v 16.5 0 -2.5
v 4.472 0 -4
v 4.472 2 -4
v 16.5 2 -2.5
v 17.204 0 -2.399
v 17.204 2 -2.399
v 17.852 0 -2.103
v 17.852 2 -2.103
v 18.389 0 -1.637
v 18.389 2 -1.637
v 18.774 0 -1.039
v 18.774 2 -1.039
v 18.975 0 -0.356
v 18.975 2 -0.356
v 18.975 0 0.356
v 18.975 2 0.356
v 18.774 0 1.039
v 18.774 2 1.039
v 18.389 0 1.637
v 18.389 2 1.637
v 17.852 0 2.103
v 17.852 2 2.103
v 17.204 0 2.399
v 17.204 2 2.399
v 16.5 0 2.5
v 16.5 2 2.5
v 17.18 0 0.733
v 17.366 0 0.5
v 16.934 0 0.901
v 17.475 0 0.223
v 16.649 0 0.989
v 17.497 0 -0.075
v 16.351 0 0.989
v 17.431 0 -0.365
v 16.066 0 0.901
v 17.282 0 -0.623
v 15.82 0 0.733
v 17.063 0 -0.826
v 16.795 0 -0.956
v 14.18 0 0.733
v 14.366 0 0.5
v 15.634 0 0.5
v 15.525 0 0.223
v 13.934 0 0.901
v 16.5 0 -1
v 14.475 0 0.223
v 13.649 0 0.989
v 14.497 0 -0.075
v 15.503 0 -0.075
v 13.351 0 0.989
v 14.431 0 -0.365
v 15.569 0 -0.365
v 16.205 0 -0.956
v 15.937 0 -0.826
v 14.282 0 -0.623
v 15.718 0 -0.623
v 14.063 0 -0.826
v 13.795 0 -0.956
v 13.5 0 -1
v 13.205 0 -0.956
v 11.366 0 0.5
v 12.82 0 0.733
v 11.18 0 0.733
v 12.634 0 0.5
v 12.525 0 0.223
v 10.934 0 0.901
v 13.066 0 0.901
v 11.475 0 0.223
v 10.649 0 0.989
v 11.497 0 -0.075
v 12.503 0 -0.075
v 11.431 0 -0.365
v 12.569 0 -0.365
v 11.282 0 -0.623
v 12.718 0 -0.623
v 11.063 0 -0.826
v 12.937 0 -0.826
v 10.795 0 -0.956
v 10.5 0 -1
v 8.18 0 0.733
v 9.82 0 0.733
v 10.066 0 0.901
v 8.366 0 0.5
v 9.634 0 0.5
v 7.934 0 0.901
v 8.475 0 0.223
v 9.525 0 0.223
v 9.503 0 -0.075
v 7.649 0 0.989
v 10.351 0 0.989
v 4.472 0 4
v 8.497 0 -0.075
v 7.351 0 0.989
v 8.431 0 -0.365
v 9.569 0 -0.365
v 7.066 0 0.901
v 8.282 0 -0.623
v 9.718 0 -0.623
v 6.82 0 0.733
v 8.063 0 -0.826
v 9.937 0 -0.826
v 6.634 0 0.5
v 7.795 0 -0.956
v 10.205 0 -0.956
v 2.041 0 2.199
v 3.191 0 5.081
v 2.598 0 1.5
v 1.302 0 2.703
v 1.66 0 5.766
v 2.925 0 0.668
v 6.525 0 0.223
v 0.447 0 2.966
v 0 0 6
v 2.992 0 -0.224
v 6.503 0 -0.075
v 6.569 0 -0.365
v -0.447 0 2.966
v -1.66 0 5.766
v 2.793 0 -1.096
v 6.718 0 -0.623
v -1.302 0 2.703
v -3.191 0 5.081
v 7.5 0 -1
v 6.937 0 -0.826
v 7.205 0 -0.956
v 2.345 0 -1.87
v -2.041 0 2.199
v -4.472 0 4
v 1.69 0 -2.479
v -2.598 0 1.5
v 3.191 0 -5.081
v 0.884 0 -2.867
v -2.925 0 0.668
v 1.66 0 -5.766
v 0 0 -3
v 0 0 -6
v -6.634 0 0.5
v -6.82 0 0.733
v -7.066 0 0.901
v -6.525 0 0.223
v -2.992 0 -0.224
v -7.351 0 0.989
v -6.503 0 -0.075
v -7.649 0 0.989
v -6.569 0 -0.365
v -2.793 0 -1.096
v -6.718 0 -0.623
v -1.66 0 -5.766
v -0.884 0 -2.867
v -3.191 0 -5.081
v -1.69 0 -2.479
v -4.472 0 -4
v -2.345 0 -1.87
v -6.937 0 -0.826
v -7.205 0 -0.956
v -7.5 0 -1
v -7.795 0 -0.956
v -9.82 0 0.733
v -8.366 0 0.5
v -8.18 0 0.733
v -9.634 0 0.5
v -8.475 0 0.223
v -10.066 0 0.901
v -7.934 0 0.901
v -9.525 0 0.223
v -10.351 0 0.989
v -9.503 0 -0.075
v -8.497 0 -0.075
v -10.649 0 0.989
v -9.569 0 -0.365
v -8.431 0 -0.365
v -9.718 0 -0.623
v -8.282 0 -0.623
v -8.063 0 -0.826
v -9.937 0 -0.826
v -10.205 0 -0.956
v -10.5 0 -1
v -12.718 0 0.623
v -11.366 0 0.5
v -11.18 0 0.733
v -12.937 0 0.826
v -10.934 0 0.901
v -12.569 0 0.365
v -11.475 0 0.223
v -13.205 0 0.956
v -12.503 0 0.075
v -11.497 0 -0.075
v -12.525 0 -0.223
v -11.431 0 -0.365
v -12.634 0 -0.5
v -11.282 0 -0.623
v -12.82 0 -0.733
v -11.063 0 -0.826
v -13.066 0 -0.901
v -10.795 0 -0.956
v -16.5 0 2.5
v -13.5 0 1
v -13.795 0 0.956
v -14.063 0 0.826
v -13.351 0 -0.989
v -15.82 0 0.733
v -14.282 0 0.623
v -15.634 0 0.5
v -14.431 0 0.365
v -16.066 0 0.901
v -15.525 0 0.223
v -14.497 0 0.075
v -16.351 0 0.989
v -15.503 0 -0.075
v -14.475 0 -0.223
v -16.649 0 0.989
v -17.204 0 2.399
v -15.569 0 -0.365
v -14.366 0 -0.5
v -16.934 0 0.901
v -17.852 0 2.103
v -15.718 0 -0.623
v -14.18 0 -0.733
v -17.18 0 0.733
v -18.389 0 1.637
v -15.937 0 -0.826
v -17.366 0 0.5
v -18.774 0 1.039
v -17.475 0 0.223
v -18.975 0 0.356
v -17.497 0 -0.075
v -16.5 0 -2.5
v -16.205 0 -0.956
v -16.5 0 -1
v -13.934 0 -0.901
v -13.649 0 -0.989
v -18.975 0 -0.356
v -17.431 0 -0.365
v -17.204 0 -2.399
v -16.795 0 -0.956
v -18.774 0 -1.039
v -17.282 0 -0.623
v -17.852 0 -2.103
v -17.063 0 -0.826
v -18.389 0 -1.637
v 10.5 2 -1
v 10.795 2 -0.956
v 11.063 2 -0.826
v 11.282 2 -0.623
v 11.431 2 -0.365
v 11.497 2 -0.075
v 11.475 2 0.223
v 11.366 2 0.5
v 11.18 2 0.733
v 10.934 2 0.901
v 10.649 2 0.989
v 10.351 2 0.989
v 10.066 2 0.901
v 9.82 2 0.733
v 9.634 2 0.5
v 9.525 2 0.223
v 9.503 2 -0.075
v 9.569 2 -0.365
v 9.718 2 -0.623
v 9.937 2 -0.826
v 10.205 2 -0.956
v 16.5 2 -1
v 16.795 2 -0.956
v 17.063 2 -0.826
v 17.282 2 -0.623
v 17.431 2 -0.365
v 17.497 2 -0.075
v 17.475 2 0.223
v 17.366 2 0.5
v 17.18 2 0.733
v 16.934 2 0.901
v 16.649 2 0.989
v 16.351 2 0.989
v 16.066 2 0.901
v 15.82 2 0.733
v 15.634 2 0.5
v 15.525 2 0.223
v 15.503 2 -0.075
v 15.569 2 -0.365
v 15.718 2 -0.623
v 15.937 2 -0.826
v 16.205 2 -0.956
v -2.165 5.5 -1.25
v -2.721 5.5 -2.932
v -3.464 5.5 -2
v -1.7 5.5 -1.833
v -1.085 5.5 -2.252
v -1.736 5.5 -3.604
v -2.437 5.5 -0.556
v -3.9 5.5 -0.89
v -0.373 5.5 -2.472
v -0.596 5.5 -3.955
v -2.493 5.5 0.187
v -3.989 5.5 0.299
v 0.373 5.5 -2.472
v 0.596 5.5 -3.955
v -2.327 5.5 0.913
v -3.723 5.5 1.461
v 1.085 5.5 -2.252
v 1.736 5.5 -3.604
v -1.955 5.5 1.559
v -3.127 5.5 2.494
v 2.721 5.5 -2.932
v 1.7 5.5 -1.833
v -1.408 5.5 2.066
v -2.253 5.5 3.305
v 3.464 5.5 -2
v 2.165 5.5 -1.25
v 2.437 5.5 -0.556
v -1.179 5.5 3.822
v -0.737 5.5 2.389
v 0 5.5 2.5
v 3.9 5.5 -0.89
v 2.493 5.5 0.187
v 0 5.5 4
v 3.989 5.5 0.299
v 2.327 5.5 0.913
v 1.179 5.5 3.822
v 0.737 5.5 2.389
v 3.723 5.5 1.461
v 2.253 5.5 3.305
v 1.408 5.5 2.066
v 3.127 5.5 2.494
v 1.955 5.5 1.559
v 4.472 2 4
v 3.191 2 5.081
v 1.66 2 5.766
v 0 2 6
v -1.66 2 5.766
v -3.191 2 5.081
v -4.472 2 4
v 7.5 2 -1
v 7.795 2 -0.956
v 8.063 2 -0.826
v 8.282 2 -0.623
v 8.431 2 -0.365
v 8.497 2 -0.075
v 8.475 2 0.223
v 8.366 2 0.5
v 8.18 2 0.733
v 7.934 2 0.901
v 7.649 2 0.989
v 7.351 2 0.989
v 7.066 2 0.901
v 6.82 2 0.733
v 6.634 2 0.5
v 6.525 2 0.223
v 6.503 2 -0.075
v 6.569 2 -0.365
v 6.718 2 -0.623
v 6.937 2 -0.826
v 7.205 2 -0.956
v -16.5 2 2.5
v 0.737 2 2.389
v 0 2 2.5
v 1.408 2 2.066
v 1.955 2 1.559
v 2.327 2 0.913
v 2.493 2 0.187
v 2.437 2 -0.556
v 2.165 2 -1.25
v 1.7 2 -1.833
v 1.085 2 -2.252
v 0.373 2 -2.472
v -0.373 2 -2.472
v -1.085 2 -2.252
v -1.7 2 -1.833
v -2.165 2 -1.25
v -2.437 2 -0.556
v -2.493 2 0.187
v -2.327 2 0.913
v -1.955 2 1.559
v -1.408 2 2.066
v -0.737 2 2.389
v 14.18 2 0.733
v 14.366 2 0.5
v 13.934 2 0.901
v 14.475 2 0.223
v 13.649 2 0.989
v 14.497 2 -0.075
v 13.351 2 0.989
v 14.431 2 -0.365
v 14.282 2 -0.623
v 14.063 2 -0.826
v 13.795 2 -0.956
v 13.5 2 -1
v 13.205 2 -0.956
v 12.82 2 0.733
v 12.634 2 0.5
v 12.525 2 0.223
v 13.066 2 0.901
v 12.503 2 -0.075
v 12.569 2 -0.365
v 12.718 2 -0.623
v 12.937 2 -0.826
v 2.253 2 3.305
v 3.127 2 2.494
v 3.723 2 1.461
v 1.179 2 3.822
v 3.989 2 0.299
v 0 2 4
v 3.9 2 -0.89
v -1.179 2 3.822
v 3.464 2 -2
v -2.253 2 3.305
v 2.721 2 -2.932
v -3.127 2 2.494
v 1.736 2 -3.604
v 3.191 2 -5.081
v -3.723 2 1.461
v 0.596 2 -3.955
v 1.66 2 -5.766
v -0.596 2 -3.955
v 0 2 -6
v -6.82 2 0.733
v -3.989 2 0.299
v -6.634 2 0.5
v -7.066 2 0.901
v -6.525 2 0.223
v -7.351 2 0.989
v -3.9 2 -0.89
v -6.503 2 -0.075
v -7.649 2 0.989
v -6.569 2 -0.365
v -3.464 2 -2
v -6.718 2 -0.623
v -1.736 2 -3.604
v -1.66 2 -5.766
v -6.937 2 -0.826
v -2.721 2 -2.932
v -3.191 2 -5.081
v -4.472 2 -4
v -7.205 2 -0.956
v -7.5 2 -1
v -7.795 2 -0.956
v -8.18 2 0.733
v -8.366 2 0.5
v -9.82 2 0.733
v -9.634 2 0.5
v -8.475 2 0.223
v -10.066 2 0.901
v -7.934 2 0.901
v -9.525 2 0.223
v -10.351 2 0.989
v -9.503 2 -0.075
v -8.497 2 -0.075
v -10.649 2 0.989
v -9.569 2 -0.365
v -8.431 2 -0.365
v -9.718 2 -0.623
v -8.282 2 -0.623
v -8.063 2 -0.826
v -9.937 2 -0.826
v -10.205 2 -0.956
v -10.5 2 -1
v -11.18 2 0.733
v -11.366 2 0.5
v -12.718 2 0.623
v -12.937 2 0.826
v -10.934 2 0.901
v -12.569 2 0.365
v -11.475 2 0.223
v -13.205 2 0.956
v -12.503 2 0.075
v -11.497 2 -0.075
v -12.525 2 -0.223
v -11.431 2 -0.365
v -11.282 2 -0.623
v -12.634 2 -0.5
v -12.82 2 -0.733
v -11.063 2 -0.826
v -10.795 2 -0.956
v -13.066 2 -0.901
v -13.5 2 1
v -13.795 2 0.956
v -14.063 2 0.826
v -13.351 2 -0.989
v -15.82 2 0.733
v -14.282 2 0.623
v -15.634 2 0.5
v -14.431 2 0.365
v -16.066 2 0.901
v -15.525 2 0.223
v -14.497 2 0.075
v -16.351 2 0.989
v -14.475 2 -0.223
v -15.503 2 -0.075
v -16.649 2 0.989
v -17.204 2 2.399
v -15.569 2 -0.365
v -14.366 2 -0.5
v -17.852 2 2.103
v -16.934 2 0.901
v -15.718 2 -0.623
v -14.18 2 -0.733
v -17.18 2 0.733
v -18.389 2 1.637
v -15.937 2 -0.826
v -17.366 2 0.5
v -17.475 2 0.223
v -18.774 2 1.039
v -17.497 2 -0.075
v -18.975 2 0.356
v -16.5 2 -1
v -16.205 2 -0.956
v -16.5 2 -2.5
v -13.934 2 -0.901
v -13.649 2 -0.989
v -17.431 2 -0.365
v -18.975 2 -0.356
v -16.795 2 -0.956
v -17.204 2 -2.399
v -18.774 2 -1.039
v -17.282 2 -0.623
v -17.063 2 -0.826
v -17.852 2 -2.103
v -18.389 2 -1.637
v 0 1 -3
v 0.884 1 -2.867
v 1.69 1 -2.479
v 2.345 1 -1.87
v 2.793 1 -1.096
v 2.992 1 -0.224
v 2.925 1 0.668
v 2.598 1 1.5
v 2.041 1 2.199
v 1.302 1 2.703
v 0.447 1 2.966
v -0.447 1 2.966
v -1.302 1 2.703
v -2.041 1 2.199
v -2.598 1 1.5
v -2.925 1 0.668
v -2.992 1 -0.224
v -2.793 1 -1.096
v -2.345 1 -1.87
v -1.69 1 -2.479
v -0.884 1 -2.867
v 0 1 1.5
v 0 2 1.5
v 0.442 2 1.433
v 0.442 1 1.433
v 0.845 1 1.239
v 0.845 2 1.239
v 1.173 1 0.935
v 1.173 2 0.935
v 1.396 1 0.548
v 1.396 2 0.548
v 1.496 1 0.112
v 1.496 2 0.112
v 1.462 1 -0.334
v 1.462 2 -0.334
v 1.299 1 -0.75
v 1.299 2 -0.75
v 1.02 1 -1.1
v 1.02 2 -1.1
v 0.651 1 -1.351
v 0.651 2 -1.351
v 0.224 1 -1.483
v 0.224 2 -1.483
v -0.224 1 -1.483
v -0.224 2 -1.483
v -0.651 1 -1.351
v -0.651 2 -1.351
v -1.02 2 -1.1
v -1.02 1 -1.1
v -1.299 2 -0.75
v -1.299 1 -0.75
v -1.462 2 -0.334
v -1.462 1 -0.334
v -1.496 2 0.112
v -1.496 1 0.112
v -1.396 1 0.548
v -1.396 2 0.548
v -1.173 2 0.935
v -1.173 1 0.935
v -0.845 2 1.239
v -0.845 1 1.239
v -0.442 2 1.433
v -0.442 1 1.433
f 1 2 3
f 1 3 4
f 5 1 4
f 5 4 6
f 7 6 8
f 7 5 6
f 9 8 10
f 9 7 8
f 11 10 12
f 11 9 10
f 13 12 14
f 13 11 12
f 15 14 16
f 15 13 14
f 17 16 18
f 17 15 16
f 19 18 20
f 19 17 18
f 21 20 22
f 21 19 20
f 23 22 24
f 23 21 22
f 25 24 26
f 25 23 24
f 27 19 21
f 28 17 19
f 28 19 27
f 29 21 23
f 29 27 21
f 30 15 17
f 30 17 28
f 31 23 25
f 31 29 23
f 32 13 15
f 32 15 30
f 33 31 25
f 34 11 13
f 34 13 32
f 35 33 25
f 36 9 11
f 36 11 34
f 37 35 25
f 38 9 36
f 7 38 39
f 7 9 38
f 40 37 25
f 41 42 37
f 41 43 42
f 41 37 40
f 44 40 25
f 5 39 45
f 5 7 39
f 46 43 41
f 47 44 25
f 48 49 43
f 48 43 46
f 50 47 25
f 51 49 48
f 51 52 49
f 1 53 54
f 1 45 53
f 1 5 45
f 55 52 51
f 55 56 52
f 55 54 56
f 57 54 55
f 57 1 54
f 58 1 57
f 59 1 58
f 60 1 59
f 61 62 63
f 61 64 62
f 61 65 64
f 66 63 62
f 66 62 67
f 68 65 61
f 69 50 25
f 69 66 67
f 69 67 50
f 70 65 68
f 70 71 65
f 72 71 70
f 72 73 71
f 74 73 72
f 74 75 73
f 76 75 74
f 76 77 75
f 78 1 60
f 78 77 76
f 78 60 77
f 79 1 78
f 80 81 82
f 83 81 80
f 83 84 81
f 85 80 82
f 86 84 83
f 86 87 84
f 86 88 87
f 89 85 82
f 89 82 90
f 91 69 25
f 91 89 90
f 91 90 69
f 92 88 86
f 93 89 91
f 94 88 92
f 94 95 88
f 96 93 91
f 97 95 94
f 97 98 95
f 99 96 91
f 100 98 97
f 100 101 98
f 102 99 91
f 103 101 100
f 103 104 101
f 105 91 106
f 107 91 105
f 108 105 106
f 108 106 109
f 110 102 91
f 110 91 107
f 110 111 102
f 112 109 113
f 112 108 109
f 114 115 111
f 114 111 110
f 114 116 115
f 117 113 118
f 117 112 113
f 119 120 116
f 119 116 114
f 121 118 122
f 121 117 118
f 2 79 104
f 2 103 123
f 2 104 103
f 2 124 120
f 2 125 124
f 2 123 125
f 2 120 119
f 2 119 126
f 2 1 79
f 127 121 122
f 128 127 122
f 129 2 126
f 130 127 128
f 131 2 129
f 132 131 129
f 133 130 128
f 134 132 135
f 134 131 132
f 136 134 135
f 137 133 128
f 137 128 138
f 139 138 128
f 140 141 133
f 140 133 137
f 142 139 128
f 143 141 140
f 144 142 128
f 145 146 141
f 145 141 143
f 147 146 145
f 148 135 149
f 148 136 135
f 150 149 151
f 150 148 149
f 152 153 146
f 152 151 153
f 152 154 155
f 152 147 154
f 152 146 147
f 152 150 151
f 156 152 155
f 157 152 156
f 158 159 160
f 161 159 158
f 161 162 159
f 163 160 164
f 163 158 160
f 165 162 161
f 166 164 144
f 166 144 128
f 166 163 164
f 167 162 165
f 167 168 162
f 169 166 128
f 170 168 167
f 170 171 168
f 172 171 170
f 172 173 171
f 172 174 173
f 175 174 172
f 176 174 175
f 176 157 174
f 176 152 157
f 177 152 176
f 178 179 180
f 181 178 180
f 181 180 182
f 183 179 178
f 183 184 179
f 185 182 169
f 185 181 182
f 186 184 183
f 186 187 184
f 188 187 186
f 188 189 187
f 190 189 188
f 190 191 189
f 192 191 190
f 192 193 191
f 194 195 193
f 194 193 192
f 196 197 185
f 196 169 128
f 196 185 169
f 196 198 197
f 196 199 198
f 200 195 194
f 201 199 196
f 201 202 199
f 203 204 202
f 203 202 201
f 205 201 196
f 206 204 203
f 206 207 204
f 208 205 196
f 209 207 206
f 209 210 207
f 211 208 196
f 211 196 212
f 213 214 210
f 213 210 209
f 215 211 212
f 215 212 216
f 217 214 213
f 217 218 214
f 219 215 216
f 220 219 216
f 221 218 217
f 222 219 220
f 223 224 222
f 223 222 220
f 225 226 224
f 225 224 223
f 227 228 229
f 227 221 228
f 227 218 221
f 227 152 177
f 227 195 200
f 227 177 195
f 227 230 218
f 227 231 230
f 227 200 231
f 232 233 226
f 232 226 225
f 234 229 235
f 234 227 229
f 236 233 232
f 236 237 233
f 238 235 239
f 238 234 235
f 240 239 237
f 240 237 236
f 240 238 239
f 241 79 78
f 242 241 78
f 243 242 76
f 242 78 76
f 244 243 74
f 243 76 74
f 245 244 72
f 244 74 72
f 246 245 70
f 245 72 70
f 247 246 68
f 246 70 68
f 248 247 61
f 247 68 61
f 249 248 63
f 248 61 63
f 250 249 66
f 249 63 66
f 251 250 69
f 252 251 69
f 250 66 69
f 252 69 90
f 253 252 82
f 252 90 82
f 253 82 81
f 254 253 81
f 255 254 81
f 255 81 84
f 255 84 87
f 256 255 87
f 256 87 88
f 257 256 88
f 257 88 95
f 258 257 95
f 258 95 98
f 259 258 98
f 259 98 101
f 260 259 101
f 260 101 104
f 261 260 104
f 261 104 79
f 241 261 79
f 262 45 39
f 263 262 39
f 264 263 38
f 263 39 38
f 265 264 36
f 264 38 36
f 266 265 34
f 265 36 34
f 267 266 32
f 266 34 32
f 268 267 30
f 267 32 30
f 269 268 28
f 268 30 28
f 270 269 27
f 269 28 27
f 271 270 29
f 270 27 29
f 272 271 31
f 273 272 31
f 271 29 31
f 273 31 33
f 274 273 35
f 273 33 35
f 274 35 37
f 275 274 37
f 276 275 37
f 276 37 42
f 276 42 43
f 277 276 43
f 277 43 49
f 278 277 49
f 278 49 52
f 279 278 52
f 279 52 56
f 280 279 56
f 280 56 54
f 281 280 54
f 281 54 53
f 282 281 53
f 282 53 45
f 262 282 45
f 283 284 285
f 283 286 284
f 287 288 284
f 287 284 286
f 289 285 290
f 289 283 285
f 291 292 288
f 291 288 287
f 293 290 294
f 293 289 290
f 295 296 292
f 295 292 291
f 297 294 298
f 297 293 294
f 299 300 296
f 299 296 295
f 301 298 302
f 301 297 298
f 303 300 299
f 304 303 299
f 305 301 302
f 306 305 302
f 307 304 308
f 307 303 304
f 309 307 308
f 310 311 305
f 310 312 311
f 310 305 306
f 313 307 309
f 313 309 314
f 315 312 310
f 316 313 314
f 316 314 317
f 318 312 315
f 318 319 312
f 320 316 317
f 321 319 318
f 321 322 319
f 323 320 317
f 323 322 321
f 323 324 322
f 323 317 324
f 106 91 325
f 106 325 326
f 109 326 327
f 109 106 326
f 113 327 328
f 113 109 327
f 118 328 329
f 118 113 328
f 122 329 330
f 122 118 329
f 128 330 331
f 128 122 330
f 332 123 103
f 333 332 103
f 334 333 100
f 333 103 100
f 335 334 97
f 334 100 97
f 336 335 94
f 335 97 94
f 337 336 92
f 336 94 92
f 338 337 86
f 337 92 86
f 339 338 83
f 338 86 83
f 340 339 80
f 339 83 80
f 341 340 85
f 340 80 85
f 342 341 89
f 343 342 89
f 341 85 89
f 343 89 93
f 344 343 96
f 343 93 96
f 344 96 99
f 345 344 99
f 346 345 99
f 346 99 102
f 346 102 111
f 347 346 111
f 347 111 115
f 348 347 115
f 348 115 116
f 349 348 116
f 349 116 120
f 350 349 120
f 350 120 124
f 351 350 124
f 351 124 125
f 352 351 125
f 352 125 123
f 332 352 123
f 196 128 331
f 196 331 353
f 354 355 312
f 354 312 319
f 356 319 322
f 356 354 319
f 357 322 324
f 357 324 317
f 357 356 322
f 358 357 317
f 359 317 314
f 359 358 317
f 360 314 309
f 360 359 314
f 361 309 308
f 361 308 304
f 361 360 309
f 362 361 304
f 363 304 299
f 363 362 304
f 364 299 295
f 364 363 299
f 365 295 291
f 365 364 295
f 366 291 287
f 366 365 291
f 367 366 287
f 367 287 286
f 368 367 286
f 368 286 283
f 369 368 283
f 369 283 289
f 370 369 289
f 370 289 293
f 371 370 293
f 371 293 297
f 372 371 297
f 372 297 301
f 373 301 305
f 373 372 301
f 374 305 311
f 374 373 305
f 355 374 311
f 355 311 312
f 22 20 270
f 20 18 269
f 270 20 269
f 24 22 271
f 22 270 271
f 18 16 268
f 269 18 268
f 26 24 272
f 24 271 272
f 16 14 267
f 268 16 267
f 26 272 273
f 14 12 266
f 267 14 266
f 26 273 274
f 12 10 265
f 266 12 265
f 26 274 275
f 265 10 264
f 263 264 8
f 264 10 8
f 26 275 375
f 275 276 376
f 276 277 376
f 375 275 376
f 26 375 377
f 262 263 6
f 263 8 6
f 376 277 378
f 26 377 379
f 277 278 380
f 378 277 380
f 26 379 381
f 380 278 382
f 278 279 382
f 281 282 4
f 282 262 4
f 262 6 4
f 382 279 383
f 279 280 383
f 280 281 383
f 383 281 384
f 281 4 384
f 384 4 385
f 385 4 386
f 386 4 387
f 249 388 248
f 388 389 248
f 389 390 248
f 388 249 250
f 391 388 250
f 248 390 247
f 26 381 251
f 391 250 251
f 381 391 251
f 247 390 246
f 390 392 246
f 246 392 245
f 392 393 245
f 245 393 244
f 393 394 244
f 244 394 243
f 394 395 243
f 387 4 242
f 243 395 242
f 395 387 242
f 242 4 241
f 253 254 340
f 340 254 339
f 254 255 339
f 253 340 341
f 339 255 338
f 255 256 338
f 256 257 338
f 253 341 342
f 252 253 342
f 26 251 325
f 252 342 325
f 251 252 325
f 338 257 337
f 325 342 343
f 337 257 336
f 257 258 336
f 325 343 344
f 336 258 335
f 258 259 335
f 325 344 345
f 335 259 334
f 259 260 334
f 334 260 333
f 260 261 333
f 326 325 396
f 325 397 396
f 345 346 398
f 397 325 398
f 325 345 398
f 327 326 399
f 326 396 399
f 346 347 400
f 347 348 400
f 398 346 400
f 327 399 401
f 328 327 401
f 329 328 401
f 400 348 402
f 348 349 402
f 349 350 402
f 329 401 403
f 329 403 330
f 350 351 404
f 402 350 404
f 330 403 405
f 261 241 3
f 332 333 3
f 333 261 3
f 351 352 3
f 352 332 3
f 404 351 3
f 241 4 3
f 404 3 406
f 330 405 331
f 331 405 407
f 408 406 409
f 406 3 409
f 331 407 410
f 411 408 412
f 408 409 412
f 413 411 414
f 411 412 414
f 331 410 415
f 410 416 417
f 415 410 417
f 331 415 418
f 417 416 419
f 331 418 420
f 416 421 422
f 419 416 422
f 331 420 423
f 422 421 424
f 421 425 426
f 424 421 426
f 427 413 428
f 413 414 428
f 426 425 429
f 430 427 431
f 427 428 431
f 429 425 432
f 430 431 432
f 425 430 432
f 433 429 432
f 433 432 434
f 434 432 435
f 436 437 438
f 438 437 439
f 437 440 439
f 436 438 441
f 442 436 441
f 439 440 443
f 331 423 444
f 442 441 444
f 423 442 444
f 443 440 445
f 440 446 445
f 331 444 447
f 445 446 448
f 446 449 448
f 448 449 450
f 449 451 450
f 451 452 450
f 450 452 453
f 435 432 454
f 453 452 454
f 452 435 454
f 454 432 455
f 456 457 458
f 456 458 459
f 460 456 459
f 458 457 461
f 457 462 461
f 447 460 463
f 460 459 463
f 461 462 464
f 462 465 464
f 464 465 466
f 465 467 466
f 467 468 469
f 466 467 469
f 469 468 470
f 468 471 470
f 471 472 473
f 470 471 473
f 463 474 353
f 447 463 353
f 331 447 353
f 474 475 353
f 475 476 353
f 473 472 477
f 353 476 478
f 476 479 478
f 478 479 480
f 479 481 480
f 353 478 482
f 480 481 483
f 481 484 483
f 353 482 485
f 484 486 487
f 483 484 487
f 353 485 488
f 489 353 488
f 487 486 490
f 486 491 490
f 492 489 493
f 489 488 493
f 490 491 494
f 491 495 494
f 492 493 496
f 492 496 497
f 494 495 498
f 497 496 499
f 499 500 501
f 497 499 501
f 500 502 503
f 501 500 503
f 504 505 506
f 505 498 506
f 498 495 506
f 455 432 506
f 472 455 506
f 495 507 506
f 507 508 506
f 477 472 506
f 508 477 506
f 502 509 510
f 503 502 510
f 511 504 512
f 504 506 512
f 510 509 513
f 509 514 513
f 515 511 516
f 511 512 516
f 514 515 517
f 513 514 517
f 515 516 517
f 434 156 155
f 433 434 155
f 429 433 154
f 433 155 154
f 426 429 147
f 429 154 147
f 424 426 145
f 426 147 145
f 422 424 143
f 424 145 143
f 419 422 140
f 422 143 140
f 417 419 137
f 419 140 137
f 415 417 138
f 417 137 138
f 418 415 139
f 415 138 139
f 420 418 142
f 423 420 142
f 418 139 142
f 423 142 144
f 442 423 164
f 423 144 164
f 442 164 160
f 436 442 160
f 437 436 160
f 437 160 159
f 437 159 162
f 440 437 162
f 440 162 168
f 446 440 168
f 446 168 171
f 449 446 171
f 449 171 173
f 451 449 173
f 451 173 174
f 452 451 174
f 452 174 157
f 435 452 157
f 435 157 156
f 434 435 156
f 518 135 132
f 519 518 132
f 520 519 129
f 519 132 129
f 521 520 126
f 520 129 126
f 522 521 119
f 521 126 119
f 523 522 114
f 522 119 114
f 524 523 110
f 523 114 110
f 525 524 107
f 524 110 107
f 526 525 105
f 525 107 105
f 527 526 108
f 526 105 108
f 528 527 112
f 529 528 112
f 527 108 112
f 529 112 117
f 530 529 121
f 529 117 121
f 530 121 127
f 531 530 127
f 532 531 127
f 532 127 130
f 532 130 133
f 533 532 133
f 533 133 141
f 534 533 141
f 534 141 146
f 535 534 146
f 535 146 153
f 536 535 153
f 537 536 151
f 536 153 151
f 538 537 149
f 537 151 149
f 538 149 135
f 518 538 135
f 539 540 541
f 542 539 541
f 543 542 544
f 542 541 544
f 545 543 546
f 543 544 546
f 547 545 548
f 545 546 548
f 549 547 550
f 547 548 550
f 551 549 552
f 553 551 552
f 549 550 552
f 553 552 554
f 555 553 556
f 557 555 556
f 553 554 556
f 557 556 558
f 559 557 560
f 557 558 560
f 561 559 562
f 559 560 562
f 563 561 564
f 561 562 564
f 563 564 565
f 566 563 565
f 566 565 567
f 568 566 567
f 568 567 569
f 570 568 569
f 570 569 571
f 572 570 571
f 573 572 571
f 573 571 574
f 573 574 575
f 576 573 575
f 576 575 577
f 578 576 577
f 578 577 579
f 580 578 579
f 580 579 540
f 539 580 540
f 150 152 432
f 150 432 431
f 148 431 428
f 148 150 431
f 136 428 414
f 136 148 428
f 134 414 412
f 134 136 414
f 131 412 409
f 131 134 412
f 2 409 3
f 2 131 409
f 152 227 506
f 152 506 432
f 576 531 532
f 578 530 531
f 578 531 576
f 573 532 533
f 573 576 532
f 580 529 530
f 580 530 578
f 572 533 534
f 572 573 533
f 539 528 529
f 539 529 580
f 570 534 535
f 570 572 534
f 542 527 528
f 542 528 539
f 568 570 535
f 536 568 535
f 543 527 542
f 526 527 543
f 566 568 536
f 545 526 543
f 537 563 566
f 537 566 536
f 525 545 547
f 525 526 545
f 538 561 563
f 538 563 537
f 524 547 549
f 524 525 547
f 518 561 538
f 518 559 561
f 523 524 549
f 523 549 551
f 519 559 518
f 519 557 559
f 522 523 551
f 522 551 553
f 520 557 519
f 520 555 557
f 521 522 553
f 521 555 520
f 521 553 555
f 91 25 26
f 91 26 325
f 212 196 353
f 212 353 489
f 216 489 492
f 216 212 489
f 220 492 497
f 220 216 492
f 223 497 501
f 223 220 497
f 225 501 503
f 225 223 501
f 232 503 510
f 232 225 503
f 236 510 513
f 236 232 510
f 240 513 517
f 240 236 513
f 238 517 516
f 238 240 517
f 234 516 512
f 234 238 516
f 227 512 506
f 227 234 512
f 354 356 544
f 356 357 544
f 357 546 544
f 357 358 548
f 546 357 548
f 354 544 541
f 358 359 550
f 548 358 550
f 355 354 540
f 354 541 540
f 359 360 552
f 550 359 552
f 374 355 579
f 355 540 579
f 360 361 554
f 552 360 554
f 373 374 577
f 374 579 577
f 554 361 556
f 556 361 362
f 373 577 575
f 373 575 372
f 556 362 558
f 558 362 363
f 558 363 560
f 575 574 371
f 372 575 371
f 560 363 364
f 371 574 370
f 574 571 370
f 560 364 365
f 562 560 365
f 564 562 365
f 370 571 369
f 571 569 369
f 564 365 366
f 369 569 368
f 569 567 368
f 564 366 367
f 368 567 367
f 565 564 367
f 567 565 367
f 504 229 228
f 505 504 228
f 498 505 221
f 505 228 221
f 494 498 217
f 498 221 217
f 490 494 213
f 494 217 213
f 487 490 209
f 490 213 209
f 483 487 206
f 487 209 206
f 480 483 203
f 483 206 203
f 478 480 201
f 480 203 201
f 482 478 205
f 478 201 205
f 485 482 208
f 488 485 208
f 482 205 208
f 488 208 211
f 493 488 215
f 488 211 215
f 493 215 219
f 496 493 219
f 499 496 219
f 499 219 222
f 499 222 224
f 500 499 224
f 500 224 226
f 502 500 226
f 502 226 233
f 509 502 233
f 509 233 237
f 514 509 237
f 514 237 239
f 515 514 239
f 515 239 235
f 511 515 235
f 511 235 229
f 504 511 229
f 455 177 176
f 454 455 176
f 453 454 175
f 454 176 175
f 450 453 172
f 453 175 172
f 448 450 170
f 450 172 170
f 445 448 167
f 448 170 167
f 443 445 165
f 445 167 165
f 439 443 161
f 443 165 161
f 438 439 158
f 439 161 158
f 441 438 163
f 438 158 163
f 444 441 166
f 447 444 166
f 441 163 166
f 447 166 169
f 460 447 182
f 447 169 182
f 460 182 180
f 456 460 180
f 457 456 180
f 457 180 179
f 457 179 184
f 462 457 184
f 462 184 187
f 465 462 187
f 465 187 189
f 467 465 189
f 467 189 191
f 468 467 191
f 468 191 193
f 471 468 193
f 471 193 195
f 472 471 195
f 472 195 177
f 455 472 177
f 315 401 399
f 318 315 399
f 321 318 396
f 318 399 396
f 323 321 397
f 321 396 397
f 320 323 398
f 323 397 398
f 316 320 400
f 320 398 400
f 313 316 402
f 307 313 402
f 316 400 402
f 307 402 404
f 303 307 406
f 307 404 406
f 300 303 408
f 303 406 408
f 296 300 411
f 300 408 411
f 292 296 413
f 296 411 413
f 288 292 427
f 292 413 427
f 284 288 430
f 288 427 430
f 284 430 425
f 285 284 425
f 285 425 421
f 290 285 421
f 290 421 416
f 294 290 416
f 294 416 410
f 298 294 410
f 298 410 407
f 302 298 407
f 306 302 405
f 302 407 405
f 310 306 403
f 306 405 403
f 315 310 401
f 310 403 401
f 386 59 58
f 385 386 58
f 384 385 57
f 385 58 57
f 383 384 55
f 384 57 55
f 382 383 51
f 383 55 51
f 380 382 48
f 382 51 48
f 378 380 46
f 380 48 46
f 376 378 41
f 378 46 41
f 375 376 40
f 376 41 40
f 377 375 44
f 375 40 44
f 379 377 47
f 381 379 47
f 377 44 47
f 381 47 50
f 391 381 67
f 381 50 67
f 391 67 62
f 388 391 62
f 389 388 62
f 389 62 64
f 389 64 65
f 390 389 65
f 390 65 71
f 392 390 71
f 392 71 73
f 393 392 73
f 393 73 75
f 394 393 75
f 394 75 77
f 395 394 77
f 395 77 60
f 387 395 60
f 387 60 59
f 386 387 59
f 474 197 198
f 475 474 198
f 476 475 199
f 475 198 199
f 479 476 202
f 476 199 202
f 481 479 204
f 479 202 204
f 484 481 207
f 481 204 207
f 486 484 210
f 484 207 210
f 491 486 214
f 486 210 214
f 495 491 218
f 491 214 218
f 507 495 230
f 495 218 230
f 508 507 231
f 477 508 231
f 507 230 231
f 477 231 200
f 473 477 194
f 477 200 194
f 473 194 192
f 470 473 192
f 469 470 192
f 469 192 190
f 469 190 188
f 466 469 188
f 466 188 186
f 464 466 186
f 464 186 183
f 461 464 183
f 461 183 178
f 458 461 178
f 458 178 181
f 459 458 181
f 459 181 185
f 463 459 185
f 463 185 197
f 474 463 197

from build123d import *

# Parameters (mm, degrees)
BOSS_EXTRUDE1_DEPTH = 2
SKETCH2_R           = 4
SKETCH2_R_2         = 2.5
BOSS_EXTRUDE2_DEPTH = 3.5
SKETCH3_R           = 1.5
CUT_EXTRUDE1_DEPTH  = 5
SKETCH4_R           = 3
CUT_EXTRUDE2_DEPTH  = 1
SKETCH5_R           = 1
CUT_EXTRUDE3_DEPTH  = 5


with BuildPart() as part:
    # Sketch1 → Boss-Extrude1 (new body)
    with BuildSketch(Plane(origin=(0, 0, 0), x_dir=(1, 0, 0), z_dir=(0, 1, 0))):
        with BuildLine():
            Line((-16.5, 2.5), (-4.472135955, 4))
            ThreePointArc((-4.472135955, 4), (0, 6), (4.472135955, 4))
            Line((4.472135955, 4), (16.5, 2.5))
            ThreePointArc((16.5, 2.5), (19, 0), (16.5, -2.5))
            Line((16.5, -2.5), (4.472135955, -4))
            ThreePointArc((4.472135955, -4), (0, -6), (-4.472135955, -4))
            Line((-4.472135955, -4), (-16.5, -2.5))
            ThreePointArc((-16.5, -2.5), (-19, 0), (-16.5, 2.5))
        make_face()
    extrude(amount=BOSS_EXTRUDE1_DEPTH)

    # Sketch2 → Boss-Extrude2 (add)
    with BuildSketch(Plane(origin=(0, 2, 0), x_dir=(1, 0, 0), z_dir=(0, 1, 0))):
        with Locations(Location((0, 0, 0), (0, 0, 270))):
            Circle(SKETCH2_R)
        with Locations(Location((0, 0, 0), (0, 0, 270))):
            Circle(SKETCH2_R_2, mode=Mode.SUBTRACT)
    extrude(amount=BOSS_EXTRUDE2_DEPTH)

    # Sketch3 → Cut-Extrude1 (cut)
    with BuildSketch(Plane(origin=(0, 2, 0), x_dir=(1, 0, 0), z_dir=(0, 1, 0))):
        with Locations(Location((0, 0, 0), (0, 0, 270))):
            Circle(SKETCH3_R)
    extrude(amount=-CUT_EXTRUDE1_DEPTH, mode=Mode.SUBTRACT)

    # Sketch4 → Cut-Extrude2 (cut)
    with BuildSketch(Plane.XZ):
        with Locations(Location((0, 0, 0), (0, 0, 270))):
            Circle(SKETCH4_R)
    extrude(amount=-CUT_EXTRUDE2_DEPTH, mode=Mode.SUBTRACT)

    # Sketch5 → Cut-Extrude3 (cut)
    with BuildSketch(Plane.XZ):
        with Locations(Location((-16.5, 0, 0), (0, 0, 270))):
            Circle(SKETCH5_R)
        with Locations(Location((-10.5, 0, 0), (0, 0, 270))):
            Circle(SKETCH5_R)
        with Locations(Location((-7.5, 0, 0), (0, 0, 270))):
            Circle(SKETCH5_R)
        with Locations(Location((7.5, 0, 0), (0, 0, 270))):
            Circle(SKETCH5_R)
        with Locations(Location((10.5, 0, 0), (0, 0, 270))):
            Circle(SKETCH5_R)
        with Locations(Location((13.5, 0, 0), (0, 0, 270))):
            Circle(SKETCH5_R)
        with Locations(Location((16.5, 0, 0), (0, 0, 270))):
            Circle(SKETCH5_R)
        with Locations(Location((-13.5, 0, 0), (0, 0, 90))):
            Circle(SKETCH5_R)
    extrude(amount=-CUT_EXTRUDE3_DEPTH, mode=Mode.SUBTRACT)


solid = part.part
